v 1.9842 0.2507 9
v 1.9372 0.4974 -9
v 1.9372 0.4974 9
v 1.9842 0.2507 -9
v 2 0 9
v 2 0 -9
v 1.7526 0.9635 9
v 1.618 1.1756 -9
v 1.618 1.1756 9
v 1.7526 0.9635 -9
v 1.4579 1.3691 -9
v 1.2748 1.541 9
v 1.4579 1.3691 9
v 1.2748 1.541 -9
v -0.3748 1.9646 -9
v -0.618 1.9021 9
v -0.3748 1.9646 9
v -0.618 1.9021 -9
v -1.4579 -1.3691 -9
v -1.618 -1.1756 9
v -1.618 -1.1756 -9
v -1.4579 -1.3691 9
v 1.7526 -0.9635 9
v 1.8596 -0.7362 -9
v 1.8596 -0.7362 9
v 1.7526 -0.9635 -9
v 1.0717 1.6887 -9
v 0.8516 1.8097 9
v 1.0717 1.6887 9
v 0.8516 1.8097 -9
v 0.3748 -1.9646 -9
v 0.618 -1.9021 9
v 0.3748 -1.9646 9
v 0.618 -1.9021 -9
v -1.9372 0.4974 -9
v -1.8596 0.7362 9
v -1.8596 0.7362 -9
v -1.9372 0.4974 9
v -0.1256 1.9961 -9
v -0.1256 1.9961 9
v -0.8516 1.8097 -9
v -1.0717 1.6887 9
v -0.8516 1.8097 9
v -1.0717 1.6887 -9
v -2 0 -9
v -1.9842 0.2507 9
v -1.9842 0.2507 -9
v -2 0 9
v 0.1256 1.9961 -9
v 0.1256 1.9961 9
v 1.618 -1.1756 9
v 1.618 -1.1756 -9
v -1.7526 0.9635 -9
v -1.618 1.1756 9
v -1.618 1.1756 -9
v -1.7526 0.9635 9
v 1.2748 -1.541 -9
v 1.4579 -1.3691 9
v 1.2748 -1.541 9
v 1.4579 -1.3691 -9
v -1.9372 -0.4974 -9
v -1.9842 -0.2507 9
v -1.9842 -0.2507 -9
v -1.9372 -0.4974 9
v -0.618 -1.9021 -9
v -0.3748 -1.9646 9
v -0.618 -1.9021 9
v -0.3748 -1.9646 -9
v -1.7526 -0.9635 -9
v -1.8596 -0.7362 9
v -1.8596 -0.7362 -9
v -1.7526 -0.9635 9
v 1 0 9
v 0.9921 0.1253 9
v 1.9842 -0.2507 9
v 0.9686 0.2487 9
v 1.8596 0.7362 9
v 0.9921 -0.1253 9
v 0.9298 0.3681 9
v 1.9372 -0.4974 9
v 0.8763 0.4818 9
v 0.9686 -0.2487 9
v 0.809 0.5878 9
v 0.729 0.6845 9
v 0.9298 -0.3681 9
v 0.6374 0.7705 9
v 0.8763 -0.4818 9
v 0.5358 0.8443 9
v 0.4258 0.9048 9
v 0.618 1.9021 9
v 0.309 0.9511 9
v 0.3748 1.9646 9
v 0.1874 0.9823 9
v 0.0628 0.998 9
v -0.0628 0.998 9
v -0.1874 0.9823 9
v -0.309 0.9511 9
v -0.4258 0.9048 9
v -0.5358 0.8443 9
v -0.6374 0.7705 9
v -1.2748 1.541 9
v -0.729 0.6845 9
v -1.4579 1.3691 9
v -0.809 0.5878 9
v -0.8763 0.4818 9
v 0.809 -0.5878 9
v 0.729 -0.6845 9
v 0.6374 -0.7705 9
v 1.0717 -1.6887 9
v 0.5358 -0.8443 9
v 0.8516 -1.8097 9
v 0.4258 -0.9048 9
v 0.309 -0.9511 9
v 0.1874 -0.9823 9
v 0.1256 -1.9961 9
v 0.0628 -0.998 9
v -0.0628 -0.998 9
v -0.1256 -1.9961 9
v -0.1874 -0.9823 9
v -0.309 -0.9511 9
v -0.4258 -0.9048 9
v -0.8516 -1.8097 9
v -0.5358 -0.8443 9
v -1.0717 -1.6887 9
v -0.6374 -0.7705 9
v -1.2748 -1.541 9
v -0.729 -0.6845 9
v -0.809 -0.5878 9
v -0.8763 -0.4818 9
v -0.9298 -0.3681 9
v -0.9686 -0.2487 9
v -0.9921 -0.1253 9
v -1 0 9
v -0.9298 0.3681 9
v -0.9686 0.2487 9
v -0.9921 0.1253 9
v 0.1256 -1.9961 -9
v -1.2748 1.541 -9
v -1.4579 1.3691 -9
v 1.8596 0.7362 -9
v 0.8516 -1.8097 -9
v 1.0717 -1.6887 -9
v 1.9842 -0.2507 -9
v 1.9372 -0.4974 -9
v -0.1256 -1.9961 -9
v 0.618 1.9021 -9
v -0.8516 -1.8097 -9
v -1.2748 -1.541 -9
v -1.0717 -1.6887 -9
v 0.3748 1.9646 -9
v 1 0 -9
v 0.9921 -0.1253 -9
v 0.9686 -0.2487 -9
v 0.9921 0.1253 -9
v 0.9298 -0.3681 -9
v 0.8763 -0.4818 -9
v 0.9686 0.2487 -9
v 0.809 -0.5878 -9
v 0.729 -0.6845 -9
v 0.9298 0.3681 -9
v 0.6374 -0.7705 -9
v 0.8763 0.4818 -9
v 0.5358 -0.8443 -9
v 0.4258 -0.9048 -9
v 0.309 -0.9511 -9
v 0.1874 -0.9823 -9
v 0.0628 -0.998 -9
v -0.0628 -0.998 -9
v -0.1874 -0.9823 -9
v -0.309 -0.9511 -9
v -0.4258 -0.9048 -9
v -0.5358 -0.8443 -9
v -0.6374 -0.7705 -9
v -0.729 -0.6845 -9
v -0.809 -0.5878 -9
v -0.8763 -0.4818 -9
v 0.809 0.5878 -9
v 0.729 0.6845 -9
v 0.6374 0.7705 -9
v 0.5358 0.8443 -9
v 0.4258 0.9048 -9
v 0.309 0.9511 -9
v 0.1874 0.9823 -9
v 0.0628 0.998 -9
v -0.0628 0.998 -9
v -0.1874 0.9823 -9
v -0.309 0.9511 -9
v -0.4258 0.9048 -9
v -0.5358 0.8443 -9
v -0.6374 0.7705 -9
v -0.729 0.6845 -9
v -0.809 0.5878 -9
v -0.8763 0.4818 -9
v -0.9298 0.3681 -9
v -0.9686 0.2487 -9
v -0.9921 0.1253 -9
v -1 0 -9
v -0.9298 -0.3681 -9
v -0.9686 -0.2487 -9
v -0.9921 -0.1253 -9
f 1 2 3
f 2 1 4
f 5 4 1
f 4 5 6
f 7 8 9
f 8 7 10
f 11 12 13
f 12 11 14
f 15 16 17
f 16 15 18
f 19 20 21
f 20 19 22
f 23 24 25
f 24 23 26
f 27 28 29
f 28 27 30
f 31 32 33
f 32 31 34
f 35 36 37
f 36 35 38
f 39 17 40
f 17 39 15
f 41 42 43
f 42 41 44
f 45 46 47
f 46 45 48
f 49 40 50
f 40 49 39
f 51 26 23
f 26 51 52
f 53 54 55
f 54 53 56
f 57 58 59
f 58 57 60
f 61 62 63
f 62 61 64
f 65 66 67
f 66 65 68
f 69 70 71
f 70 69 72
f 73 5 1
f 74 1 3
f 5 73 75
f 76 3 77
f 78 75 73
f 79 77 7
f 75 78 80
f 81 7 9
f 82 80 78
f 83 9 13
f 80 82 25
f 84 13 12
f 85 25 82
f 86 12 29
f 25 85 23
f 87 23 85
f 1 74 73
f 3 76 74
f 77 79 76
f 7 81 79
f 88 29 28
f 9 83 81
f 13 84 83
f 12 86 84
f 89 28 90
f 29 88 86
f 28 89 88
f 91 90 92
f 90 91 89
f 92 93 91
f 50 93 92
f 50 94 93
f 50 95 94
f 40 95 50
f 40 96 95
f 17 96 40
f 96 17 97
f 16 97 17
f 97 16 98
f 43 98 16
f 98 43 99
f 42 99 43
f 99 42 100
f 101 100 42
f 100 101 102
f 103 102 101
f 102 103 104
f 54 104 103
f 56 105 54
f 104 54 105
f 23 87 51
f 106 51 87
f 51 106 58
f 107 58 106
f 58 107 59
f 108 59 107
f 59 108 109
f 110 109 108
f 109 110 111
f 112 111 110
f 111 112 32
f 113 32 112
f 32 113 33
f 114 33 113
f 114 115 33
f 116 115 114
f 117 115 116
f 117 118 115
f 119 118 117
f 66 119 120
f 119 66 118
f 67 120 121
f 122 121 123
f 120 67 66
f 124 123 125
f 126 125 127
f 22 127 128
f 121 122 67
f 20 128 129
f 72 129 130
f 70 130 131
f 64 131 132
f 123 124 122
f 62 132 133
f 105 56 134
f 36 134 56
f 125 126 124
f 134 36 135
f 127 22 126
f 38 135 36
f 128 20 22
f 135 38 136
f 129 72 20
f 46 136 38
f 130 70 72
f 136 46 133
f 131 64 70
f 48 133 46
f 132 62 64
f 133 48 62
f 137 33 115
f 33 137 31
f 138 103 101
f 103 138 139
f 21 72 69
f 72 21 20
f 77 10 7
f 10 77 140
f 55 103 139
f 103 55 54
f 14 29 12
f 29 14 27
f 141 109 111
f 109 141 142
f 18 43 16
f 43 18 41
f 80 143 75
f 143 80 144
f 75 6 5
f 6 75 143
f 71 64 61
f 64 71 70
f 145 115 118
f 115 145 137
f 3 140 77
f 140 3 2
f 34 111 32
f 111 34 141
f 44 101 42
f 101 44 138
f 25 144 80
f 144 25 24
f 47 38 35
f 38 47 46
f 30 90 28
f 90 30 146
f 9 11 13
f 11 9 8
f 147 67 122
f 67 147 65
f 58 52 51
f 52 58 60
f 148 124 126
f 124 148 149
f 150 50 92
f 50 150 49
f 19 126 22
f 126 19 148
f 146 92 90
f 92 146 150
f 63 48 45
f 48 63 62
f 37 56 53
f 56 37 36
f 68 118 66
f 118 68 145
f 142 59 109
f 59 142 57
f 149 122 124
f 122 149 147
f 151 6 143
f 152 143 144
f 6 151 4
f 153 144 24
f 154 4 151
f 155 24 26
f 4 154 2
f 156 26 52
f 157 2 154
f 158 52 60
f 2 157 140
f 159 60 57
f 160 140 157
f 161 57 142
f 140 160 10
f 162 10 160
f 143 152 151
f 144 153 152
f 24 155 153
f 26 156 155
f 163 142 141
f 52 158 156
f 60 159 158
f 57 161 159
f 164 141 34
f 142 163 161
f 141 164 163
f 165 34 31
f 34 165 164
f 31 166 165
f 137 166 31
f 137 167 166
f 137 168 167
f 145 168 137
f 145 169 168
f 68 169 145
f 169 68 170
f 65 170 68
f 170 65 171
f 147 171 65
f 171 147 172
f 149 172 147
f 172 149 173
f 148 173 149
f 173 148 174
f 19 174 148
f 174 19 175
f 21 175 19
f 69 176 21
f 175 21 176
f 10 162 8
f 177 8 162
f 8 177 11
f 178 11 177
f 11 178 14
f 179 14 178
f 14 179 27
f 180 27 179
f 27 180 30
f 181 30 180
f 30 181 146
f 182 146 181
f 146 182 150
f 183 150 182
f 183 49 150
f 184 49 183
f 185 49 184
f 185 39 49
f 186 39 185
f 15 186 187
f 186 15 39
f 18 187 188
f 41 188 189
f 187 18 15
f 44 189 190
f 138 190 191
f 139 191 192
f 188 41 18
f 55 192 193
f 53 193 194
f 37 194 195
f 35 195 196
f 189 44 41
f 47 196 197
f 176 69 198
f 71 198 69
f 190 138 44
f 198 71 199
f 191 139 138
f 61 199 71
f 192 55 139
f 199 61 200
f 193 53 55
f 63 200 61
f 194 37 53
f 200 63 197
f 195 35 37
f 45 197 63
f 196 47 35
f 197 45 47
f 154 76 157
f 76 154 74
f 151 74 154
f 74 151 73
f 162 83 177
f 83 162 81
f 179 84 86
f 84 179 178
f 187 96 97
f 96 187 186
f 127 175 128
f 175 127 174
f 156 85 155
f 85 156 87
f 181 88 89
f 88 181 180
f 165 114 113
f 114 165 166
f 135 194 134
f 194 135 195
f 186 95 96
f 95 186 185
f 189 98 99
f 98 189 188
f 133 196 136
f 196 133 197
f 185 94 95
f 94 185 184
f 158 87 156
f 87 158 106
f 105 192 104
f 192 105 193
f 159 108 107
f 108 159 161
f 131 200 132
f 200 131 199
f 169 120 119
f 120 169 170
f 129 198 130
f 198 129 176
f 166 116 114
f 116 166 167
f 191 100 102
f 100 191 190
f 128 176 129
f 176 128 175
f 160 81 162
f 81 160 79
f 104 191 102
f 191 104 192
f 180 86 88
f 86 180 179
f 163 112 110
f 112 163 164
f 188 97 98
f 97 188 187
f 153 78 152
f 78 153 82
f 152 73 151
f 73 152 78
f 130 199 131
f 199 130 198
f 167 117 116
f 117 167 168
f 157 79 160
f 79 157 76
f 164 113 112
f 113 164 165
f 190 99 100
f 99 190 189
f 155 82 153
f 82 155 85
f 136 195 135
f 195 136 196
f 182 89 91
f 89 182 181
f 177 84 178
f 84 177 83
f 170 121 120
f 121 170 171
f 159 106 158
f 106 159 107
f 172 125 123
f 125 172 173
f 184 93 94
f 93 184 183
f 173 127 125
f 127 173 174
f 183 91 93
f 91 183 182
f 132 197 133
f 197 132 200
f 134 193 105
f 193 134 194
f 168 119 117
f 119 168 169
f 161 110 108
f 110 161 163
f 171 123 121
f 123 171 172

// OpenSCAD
$fn = 50;


difference() {
	union() {
		translate(v = [0, 0, -9.0000000000]) {
			cylinder(h = 18, r = 2.0000000000);
		}
	}
	union() {
		translate(v = [0, 0, -100.0000000000]) {
			cylinder(h = 200, r = 1.0000000000);
		}
	}
}
